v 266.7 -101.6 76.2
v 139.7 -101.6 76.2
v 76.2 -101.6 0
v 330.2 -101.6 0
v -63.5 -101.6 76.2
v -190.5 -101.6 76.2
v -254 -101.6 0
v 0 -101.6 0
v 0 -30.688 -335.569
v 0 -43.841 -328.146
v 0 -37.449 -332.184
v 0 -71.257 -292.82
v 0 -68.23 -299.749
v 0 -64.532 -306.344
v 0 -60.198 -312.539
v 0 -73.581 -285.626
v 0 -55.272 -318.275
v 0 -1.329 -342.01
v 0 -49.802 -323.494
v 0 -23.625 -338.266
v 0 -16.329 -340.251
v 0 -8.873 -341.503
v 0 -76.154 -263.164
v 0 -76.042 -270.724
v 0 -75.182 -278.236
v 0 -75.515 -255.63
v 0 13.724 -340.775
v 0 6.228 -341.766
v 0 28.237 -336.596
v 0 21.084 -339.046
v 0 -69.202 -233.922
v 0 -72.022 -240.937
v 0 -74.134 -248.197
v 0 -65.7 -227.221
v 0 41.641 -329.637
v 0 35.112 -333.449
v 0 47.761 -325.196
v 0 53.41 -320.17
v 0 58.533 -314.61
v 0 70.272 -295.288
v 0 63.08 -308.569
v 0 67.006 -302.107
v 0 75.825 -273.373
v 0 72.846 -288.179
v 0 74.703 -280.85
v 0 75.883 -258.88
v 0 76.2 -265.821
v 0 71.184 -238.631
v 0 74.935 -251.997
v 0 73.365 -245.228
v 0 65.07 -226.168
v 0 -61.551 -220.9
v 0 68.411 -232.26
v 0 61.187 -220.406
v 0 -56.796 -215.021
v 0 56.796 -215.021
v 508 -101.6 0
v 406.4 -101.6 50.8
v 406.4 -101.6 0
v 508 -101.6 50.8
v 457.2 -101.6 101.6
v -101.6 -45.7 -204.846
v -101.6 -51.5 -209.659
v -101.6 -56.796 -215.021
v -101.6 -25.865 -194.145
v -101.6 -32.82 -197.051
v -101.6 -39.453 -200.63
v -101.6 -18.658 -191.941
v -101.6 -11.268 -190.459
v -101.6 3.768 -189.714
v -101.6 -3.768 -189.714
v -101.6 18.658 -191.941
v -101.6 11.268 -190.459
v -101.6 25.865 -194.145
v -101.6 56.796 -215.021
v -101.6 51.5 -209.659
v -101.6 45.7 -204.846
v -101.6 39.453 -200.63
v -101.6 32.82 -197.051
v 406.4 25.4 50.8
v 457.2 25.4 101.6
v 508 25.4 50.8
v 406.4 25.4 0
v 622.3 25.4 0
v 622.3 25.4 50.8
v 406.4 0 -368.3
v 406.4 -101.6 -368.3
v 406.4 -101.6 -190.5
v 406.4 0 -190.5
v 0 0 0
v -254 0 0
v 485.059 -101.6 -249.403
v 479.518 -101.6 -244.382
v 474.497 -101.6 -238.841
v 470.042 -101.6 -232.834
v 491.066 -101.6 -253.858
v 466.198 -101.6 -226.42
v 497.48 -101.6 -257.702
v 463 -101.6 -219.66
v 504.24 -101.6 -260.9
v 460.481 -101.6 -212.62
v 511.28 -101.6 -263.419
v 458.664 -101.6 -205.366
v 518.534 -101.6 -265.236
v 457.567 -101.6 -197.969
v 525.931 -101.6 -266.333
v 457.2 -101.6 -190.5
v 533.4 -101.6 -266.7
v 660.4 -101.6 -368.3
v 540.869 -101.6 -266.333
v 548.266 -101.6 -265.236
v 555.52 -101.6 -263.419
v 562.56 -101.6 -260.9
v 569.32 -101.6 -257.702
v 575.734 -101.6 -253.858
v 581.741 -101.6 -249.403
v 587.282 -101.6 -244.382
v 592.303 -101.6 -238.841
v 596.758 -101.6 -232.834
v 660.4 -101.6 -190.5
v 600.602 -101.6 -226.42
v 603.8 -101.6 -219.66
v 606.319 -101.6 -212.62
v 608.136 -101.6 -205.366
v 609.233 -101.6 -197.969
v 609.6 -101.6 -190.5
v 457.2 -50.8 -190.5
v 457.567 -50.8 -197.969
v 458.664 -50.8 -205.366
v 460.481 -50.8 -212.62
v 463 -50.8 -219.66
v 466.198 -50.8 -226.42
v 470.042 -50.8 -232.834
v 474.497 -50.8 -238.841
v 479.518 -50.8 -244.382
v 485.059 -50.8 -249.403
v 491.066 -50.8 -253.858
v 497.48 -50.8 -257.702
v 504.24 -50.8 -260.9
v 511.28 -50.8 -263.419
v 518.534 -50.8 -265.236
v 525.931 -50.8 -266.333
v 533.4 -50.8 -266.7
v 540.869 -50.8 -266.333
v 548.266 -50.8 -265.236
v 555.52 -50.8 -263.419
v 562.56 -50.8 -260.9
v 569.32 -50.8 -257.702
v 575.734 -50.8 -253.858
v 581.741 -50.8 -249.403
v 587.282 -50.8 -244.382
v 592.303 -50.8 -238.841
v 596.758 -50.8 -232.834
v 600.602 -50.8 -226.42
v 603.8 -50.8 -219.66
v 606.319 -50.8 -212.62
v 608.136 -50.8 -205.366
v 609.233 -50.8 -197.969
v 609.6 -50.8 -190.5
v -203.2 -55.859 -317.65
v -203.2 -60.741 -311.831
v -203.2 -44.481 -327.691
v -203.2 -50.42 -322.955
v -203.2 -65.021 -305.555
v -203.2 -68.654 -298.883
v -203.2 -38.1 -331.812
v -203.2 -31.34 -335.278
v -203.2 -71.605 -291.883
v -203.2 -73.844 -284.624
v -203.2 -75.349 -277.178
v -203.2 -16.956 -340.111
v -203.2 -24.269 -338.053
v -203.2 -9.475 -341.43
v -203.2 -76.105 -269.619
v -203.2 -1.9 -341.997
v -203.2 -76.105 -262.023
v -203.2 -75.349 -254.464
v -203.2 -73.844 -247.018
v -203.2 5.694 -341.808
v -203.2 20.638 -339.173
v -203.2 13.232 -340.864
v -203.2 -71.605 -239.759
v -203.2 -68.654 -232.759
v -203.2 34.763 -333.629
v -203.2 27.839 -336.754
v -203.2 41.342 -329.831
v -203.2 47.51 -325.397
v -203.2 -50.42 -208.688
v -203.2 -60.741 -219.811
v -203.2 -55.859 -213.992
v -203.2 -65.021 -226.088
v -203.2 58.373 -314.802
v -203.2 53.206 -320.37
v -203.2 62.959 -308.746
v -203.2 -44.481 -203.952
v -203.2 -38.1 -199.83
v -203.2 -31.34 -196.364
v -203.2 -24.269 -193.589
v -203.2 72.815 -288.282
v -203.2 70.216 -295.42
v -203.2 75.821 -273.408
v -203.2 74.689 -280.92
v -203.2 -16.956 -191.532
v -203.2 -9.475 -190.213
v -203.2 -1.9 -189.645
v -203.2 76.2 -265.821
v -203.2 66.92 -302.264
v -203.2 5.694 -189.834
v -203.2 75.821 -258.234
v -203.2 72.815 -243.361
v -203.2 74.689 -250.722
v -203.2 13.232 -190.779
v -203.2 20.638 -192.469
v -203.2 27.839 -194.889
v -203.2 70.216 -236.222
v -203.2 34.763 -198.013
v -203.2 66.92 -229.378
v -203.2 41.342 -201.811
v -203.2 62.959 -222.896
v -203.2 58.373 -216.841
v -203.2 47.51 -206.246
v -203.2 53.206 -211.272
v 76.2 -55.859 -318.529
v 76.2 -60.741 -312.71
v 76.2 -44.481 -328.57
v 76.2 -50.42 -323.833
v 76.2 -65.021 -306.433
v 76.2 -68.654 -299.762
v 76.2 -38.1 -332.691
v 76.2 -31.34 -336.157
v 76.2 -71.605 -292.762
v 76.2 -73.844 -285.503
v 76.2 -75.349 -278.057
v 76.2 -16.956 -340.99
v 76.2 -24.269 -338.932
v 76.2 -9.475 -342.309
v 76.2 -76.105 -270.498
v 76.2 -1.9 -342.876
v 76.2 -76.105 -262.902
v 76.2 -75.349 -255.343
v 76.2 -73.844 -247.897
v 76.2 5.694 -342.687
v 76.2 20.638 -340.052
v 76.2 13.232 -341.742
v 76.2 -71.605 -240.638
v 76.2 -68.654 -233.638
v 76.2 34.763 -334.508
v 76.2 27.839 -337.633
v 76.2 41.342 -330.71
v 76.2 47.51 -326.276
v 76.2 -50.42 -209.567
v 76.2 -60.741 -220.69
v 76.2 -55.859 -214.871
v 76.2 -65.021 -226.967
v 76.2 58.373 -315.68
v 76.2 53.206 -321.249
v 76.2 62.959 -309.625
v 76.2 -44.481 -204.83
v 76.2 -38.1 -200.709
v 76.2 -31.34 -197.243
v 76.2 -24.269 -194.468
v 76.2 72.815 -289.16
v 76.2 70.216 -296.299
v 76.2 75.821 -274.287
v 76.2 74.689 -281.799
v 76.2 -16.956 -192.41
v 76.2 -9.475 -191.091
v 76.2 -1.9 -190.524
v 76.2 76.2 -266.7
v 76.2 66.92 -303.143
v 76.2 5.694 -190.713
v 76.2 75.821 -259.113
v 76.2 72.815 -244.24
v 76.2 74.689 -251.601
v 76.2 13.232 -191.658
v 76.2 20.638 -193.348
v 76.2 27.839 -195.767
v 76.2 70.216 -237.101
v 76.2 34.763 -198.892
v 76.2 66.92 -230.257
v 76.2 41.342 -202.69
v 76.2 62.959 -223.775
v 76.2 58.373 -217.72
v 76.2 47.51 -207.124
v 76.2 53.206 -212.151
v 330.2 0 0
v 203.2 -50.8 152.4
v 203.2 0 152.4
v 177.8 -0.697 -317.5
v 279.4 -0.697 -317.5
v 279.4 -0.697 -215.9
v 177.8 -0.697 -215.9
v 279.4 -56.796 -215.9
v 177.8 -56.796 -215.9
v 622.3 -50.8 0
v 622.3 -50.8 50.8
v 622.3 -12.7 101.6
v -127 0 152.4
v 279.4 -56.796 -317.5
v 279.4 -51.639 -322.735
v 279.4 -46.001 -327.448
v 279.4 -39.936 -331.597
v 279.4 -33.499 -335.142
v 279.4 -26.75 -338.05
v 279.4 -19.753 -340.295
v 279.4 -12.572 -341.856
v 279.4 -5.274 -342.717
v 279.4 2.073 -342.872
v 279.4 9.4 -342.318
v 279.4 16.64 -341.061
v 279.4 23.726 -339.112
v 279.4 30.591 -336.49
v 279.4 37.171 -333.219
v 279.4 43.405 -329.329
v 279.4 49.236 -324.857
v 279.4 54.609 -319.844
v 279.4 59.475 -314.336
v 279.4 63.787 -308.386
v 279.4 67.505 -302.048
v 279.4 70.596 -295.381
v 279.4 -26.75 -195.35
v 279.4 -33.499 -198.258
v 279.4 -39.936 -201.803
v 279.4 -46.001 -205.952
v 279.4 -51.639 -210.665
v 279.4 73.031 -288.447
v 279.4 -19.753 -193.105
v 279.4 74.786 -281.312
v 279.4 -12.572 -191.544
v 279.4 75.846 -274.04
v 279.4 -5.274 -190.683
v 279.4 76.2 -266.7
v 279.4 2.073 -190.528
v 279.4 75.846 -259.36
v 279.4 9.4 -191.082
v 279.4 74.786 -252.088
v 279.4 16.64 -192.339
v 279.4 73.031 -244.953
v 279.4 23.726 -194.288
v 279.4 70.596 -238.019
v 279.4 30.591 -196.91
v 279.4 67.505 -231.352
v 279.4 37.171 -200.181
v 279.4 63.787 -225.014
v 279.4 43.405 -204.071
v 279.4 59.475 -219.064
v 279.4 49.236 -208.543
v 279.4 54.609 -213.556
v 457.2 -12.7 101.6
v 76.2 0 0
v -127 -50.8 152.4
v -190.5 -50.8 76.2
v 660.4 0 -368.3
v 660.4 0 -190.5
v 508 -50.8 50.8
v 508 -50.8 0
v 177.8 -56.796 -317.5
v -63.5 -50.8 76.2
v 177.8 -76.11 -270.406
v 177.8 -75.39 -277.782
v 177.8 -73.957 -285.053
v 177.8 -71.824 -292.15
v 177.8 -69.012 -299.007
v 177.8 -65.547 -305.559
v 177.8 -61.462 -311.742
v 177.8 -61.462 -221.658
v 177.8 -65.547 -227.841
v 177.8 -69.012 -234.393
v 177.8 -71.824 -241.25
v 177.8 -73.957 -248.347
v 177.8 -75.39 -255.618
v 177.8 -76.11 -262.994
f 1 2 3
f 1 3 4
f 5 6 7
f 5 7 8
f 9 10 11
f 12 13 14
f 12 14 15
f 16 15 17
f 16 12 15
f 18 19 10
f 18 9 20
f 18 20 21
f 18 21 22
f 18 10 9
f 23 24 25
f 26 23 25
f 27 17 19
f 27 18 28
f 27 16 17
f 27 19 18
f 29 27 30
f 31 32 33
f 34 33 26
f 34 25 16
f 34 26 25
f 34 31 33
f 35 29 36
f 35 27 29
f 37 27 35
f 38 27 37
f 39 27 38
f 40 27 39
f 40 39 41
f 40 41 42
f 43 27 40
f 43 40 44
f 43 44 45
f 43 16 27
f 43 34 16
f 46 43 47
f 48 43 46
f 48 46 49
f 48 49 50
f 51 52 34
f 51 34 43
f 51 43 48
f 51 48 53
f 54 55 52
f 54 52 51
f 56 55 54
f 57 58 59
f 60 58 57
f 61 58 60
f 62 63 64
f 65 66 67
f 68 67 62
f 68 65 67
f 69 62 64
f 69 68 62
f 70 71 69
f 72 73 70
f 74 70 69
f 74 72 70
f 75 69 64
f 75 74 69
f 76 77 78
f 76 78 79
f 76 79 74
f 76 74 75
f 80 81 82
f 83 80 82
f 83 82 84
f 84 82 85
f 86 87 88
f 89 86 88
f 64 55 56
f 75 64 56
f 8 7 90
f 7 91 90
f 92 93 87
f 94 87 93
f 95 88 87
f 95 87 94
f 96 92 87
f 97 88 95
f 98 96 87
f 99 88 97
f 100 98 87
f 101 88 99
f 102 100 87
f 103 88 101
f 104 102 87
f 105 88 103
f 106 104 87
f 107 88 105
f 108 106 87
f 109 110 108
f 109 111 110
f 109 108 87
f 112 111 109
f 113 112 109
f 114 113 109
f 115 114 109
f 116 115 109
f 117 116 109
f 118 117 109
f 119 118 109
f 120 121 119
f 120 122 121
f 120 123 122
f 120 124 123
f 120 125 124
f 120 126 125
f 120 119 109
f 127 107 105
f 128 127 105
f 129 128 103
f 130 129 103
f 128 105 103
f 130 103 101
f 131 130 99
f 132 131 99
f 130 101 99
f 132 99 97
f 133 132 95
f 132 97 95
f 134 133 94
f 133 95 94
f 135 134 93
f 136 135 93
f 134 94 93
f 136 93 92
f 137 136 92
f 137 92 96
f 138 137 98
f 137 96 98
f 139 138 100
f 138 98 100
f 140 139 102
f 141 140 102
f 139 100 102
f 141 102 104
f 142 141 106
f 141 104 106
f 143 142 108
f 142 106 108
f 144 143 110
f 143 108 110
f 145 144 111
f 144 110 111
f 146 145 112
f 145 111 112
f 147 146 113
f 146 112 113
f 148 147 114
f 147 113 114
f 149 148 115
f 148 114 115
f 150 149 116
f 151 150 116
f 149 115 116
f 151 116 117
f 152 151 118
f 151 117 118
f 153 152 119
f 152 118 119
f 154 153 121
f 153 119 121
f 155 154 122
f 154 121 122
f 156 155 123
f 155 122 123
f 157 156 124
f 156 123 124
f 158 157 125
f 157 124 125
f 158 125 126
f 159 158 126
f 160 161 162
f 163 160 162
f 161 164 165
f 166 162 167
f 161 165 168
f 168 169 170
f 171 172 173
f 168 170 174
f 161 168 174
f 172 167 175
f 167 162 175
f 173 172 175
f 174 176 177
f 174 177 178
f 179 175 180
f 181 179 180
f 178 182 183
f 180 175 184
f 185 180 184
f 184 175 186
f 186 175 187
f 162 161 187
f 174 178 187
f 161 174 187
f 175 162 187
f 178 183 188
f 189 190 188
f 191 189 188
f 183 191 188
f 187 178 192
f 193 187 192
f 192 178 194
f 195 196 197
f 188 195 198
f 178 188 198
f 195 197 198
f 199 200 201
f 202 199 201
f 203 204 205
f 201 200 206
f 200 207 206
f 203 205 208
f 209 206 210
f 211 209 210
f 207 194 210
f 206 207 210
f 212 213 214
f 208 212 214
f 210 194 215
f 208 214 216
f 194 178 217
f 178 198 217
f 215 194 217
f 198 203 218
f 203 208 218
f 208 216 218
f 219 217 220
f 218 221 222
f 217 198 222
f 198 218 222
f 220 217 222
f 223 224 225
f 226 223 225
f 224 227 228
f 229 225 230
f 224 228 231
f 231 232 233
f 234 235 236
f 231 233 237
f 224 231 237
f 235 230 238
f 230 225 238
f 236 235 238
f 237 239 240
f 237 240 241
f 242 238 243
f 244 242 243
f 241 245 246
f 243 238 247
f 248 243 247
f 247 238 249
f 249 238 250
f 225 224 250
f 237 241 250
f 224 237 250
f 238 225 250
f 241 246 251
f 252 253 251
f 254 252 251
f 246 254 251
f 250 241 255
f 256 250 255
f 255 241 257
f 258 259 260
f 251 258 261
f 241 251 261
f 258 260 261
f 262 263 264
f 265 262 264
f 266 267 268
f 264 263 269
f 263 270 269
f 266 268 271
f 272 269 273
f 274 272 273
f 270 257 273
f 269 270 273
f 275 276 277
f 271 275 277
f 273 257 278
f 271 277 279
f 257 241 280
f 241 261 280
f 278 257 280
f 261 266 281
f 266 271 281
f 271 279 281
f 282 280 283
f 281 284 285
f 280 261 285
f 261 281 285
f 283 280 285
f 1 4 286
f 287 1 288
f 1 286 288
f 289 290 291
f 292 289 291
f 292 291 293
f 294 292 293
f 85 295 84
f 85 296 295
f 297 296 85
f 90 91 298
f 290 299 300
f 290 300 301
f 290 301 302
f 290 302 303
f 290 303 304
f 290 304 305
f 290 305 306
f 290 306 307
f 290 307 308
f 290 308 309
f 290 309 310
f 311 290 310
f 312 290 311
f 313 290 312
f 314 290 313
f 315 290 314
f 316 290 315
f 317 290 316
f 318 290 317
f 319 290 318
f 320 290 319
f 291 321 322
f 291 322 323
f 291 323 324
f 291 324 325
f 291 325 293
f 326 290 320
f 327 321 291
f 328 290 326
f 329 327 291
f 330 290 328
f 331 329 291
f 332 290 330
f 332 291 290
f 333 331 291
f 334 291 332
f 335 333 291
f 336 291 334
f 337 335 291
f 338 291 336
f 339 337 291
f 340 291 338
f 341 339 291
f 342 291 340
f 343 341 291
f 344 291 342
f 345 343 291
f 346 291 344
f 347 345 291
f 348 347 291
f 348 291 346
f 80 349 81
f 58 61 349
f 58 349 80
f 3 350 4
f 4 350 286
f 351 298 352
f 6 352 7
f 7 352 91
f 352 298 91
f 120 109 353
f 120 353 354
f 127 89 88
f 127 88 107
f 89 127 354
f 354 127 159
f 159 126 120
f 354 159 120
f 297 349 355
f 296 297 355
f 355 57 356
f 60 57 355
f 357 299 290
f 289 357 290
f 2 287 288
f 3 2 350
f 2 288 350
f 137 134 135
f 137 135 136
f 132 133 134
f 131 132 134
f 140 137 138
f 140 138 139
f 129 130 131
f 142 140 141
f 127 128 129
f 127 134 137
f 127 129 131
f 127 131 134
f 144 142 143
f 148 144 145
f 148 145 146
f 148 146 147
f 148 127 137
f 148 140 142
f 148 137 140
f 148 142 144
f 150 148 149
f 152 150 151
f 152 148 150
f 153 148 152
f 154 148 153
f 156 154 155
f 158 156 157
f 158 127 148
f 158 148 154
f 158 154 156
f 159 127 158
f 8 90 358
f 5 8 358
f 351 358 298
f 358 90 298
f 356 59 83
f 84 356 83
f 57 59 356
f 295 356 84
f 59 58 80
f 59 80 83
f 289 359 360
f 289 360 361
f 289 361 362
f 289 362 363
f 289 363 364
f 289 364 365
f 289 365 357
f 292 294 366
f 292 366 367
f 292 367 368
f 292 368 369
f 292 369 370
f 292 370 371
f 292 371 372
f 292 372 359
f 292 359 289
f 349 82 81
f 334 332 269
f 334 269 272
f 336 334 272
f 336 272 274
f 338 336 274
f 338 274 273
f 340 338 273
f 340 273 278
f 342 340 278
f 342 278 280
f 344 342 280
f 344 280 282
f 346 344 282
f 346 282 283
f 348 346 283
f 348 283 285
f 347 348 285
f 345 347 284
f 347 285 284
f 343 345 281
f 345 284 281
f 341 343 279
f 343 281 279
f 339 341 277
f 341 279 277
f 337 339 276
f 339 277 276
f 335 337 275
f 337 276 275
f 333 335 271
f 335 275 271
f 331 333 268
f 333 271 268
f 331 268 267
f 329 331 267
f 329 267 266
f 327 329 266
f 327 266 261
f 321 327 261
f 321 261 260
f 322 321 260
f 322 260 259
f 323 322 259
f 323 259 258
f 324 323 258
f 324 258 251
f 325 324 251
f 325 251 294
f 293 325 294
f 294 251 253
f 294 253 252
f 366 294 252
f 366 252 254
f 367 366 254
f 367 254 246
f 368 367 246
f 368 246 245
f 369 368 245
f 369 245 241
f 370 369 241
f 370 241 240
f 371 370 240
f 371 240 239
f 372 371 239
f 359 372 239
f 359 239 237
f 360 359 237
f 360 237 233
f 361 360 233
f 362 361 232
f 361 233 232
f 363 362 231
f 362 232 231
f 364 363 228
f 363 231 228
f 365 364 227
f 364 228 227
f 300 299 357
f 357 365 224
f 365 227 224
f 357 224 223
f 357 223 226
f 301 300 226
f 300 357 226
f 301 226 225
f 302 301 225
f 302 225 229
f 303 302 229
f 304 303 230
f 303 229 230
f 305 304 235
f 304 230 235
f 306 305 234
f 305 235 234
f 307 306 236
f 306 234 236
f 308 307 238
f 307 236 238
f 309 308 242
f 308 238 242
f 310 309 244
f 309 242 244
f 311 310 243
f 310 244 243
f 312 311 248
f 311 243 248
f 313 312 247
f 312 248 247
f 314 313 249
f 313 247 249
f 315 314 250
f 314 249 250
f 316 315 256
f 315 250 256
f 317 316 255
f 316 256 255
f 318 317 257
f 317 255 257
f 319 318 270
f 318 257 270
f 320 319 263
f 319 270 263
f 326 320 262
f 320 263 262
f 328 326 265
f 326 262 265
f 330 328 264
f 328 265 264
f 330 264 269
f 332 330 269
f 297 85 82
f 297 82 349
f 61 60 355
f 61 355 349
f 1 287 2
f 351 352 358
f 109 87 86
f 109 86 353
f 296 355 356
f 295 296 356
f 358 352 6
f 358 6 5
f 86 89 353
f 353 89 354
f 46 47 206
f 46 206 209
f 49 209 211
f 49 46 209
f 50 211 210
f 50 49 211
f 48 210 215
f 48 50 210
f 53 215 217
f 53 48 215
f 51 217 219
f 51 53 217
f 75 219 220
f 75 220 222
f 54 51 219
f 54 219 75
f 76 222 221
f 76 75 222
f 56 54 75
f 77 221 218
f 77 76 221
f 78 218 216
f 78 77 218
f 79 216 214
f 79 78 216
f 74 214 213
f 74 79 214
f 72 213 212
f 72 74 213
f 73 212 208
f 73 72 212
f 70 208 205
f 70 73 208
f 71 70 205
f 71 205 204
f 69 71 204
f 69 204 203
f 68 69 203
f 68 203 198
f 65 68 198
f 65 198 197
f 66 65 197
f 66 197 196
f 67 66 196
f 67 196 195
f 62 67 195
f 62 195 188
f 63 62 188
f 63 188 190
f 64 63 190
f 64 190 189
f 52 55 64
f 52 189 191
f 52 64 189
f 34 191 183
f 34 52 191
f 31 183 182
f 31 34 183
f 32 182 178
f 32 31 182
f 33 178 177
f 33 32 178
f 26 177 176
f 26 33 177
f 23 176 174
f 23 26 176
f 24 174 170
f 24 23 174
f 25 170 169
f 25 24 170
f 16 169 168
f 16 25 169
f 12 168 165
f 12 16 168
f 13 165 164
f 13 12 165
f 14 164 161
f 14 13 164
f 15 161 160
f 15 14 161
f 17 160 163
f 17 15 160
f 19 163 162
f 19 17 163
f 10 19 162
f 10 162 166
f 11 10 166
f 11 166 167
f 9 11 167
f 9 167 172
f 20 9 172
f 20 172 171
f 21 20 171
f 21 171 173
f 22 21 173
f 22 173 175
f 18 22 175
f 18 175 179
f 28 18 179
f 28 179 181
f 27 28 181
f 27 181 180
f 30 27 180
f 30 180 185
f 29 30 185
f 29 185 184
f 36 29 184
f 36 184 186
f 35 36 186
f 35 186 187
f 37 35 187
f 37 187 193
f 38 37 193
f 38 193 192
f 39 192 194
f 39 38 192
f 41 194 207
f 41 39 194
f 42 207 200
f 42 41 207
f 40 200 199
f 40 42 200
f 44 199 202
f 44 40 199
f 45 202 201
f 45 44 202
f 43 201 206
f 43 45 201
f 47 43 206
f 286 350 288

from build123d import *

# Parameters (mm, degrees)
F1_DEPTH  = 50.8
F2_DEPTH  = 50.8
F4_DEPTH  = 25.4
F6_DEPTH  = 101.6
F7_DEPTH  = 50.8
F8_DEPTH  = 25.4
F12_DEPTH = 63.5
F14_DEPTH = 127
F18_DEPTH = 165.1
F19_R     = 76.2
F20_DEPTH = 203.2
F22_DEPTH = 101.6
F24_R     = 76.2
F25_DEPTH = 203.2
F27_DEPTH = 101.6
F28_W     = 254
F28_H     = 177.8
F29_DEPTH = 101.6
F31_DEPTH = 50.8


with BuildPart() as f1:
    # F0 (on Front) → F1 (new body)
    with BuildSketch(Plane.XZ):
        Polygon((-254, 0), (0, 0), (-63.5, 76.2), (-127, 76.2), (-190.5, 76.2), align=None)
    extrude(amount=F1_DEPTH)

    # F0 (on Front) → F2 (join)
    with BuildSketch(Plane.XZ):
        Polygon((-254, 0), (0, 0), (-63.5, 76.2), (-127, 76.2), (-190.5, 76.2), align=None)
        Polygon((-127, 76.2), (-63.5, 76.2), (-127, 152.4), (-190.5, 76.2), align=None)
    extrude(amount=F2_DEPTH)

    # F3 (on face) → F4 (cut)
    with BuildSketch(Plane.XZ.offset(50.8)):
        Polygon((-190.5, 76.2), (-127, 76.2), (-63.5, 76.2), (-127, 152.4), align=None)
    extrude(amount=-F4_DEPTH, mode=Mode.SUBTRACT)

    # F7 (add): a face of the model
    f7_faces = [f1.faces().sort_by_distance(p)[0] for p in [
        (-127, -50.8, 33.8666666667),
    ]]
    extrude(f7_faces, amount=F7_DEPTH)

    # F8 (add): a face of the model
    f8_faces = [f1.faces().sort_by_distance(p)[0] for p in [
        (-127, -25.4, 101.6),
    ]]
    extrude(f8_faces, amount=F8_DEPTH)


with BuildPart() as f6:
    # F5 (on Front) → F6 (new body)
    with BuildSketch(Plane.XZ):
        Polygon((203.2, 152.4), (76.2, 0), (330.2, 0), align=None)
    extrude(amount=F6_DEPTH)

    # F11 (on 3pt) → F12 (cut, symmetric)
    with BuildSketch(Plane(origin=(203.2, 0, 0), x_dir=(0, -1, 0), z_dir=(-1, 0, 0))):
        Polygon((101.6, 76.2), (101.6, 152.4), (50.8, 152.4), align=None)
    extrude(amount=F12_DEPTH, both=True, mode=Mode.SUBTRACT)


with BuildPart() as f14:
    # F13 (on face) → F14 (new body)
    with BuildSketch(Plane.XZ.offset(101.6)):
        Polygon((406.4, 50.8), (406.4, 0), (508, 0), (508, 50.8), (457.2, 101.6), align=None)
    extrude(amount=-F14_DEPTH)

    # F17 (on 3pt) → F18 (join)
    with BuildSketch(Plane.YZ.offset(457.2)):
        Polygon((-50.8, 0), (25.4, 0), (25.4, 50.8), (-12.7, 101.6), (-50.8, 50.8), align=None)
    extrude(amount=F18_DEPTH)


with BuildPart() as f20:
    # F19 (on Right) → F20 (new body)
    with BuildSketch(Plane.YZ):
        with Locations((0, -265.8211804291)):
            Circle(F19_R)
    extrude(amount=-F20_DEPTH)

    # F21 (on face) → F22 (cut)
    with BuildSketch(Plane.YZ):
        with BuildLine():
            ThreePointArc((56.7961266285, -215.0211804291), (0, -189.6211804291), (-56.7961266285, -215.0211804291))
            Line((-56.7961266285, -215.0211804291), (56.7961266285, -215.0211804291))
        make_face()
    extrude(amount=-F22_DEPTH, mode=Mode.SUBTRACT)


with BuildPart() as f25:
    # F24 (on offset) → F25 (new body)
    with BuildSketch(Plane.YZ.offset(76.2)):
        with Locations((0, -266.7)):
            Circle(F24_R)
    extrude(amount=F25_DEPTH)

    # F26 (on face) → F27 (cut)
    with BuildSketch(Plane.YZ.offset(279.4)):
        with BuildLine():
            Line((-0.6973790218, -317.5), (-0.6973790218, -215.9))
            Line((-0.6973790218, -215.9), (-56.7961266285, -215.9))
            ThreePointArc((-56.7961266285, -215.9), (-76.2, -266.7), (-56.7961266285, -317.5))
            Line((-56.7961266285, -317.5), (-0.6973790218, -317.5))
        make_face()
    extrude(amount=-F27_DEPTH, mode=Mode.SUBTRACT)


with BuildPart() as f29:
    # F28 (on face) → F29 (new body)
    with BuildSketch(Plane.XZ.offset(101.6)):
        with Locations((533.4, -279.4)):
            Rectangle(F28_W, F28_H)
    extrude(amount=-F29_DEPTH)

    # F30 (on face) → F31 (cut)
    with BuildSketch(Plane.XZ.offset(101.6)):
        with BuildLine():
            Line((609.6, -190.5), (457.2, -190.5))
            ThreePointArc((457.2, -190.5), (533.4, -266.7), (609.6, -190.5))
        make_face()
    extrude(amount=-F31_DEPTH, mode=Mode.SUBTRACT)


solid = Compound([f1.part, f6.part, f14.part, f20.part, f25.part, f29.part])
